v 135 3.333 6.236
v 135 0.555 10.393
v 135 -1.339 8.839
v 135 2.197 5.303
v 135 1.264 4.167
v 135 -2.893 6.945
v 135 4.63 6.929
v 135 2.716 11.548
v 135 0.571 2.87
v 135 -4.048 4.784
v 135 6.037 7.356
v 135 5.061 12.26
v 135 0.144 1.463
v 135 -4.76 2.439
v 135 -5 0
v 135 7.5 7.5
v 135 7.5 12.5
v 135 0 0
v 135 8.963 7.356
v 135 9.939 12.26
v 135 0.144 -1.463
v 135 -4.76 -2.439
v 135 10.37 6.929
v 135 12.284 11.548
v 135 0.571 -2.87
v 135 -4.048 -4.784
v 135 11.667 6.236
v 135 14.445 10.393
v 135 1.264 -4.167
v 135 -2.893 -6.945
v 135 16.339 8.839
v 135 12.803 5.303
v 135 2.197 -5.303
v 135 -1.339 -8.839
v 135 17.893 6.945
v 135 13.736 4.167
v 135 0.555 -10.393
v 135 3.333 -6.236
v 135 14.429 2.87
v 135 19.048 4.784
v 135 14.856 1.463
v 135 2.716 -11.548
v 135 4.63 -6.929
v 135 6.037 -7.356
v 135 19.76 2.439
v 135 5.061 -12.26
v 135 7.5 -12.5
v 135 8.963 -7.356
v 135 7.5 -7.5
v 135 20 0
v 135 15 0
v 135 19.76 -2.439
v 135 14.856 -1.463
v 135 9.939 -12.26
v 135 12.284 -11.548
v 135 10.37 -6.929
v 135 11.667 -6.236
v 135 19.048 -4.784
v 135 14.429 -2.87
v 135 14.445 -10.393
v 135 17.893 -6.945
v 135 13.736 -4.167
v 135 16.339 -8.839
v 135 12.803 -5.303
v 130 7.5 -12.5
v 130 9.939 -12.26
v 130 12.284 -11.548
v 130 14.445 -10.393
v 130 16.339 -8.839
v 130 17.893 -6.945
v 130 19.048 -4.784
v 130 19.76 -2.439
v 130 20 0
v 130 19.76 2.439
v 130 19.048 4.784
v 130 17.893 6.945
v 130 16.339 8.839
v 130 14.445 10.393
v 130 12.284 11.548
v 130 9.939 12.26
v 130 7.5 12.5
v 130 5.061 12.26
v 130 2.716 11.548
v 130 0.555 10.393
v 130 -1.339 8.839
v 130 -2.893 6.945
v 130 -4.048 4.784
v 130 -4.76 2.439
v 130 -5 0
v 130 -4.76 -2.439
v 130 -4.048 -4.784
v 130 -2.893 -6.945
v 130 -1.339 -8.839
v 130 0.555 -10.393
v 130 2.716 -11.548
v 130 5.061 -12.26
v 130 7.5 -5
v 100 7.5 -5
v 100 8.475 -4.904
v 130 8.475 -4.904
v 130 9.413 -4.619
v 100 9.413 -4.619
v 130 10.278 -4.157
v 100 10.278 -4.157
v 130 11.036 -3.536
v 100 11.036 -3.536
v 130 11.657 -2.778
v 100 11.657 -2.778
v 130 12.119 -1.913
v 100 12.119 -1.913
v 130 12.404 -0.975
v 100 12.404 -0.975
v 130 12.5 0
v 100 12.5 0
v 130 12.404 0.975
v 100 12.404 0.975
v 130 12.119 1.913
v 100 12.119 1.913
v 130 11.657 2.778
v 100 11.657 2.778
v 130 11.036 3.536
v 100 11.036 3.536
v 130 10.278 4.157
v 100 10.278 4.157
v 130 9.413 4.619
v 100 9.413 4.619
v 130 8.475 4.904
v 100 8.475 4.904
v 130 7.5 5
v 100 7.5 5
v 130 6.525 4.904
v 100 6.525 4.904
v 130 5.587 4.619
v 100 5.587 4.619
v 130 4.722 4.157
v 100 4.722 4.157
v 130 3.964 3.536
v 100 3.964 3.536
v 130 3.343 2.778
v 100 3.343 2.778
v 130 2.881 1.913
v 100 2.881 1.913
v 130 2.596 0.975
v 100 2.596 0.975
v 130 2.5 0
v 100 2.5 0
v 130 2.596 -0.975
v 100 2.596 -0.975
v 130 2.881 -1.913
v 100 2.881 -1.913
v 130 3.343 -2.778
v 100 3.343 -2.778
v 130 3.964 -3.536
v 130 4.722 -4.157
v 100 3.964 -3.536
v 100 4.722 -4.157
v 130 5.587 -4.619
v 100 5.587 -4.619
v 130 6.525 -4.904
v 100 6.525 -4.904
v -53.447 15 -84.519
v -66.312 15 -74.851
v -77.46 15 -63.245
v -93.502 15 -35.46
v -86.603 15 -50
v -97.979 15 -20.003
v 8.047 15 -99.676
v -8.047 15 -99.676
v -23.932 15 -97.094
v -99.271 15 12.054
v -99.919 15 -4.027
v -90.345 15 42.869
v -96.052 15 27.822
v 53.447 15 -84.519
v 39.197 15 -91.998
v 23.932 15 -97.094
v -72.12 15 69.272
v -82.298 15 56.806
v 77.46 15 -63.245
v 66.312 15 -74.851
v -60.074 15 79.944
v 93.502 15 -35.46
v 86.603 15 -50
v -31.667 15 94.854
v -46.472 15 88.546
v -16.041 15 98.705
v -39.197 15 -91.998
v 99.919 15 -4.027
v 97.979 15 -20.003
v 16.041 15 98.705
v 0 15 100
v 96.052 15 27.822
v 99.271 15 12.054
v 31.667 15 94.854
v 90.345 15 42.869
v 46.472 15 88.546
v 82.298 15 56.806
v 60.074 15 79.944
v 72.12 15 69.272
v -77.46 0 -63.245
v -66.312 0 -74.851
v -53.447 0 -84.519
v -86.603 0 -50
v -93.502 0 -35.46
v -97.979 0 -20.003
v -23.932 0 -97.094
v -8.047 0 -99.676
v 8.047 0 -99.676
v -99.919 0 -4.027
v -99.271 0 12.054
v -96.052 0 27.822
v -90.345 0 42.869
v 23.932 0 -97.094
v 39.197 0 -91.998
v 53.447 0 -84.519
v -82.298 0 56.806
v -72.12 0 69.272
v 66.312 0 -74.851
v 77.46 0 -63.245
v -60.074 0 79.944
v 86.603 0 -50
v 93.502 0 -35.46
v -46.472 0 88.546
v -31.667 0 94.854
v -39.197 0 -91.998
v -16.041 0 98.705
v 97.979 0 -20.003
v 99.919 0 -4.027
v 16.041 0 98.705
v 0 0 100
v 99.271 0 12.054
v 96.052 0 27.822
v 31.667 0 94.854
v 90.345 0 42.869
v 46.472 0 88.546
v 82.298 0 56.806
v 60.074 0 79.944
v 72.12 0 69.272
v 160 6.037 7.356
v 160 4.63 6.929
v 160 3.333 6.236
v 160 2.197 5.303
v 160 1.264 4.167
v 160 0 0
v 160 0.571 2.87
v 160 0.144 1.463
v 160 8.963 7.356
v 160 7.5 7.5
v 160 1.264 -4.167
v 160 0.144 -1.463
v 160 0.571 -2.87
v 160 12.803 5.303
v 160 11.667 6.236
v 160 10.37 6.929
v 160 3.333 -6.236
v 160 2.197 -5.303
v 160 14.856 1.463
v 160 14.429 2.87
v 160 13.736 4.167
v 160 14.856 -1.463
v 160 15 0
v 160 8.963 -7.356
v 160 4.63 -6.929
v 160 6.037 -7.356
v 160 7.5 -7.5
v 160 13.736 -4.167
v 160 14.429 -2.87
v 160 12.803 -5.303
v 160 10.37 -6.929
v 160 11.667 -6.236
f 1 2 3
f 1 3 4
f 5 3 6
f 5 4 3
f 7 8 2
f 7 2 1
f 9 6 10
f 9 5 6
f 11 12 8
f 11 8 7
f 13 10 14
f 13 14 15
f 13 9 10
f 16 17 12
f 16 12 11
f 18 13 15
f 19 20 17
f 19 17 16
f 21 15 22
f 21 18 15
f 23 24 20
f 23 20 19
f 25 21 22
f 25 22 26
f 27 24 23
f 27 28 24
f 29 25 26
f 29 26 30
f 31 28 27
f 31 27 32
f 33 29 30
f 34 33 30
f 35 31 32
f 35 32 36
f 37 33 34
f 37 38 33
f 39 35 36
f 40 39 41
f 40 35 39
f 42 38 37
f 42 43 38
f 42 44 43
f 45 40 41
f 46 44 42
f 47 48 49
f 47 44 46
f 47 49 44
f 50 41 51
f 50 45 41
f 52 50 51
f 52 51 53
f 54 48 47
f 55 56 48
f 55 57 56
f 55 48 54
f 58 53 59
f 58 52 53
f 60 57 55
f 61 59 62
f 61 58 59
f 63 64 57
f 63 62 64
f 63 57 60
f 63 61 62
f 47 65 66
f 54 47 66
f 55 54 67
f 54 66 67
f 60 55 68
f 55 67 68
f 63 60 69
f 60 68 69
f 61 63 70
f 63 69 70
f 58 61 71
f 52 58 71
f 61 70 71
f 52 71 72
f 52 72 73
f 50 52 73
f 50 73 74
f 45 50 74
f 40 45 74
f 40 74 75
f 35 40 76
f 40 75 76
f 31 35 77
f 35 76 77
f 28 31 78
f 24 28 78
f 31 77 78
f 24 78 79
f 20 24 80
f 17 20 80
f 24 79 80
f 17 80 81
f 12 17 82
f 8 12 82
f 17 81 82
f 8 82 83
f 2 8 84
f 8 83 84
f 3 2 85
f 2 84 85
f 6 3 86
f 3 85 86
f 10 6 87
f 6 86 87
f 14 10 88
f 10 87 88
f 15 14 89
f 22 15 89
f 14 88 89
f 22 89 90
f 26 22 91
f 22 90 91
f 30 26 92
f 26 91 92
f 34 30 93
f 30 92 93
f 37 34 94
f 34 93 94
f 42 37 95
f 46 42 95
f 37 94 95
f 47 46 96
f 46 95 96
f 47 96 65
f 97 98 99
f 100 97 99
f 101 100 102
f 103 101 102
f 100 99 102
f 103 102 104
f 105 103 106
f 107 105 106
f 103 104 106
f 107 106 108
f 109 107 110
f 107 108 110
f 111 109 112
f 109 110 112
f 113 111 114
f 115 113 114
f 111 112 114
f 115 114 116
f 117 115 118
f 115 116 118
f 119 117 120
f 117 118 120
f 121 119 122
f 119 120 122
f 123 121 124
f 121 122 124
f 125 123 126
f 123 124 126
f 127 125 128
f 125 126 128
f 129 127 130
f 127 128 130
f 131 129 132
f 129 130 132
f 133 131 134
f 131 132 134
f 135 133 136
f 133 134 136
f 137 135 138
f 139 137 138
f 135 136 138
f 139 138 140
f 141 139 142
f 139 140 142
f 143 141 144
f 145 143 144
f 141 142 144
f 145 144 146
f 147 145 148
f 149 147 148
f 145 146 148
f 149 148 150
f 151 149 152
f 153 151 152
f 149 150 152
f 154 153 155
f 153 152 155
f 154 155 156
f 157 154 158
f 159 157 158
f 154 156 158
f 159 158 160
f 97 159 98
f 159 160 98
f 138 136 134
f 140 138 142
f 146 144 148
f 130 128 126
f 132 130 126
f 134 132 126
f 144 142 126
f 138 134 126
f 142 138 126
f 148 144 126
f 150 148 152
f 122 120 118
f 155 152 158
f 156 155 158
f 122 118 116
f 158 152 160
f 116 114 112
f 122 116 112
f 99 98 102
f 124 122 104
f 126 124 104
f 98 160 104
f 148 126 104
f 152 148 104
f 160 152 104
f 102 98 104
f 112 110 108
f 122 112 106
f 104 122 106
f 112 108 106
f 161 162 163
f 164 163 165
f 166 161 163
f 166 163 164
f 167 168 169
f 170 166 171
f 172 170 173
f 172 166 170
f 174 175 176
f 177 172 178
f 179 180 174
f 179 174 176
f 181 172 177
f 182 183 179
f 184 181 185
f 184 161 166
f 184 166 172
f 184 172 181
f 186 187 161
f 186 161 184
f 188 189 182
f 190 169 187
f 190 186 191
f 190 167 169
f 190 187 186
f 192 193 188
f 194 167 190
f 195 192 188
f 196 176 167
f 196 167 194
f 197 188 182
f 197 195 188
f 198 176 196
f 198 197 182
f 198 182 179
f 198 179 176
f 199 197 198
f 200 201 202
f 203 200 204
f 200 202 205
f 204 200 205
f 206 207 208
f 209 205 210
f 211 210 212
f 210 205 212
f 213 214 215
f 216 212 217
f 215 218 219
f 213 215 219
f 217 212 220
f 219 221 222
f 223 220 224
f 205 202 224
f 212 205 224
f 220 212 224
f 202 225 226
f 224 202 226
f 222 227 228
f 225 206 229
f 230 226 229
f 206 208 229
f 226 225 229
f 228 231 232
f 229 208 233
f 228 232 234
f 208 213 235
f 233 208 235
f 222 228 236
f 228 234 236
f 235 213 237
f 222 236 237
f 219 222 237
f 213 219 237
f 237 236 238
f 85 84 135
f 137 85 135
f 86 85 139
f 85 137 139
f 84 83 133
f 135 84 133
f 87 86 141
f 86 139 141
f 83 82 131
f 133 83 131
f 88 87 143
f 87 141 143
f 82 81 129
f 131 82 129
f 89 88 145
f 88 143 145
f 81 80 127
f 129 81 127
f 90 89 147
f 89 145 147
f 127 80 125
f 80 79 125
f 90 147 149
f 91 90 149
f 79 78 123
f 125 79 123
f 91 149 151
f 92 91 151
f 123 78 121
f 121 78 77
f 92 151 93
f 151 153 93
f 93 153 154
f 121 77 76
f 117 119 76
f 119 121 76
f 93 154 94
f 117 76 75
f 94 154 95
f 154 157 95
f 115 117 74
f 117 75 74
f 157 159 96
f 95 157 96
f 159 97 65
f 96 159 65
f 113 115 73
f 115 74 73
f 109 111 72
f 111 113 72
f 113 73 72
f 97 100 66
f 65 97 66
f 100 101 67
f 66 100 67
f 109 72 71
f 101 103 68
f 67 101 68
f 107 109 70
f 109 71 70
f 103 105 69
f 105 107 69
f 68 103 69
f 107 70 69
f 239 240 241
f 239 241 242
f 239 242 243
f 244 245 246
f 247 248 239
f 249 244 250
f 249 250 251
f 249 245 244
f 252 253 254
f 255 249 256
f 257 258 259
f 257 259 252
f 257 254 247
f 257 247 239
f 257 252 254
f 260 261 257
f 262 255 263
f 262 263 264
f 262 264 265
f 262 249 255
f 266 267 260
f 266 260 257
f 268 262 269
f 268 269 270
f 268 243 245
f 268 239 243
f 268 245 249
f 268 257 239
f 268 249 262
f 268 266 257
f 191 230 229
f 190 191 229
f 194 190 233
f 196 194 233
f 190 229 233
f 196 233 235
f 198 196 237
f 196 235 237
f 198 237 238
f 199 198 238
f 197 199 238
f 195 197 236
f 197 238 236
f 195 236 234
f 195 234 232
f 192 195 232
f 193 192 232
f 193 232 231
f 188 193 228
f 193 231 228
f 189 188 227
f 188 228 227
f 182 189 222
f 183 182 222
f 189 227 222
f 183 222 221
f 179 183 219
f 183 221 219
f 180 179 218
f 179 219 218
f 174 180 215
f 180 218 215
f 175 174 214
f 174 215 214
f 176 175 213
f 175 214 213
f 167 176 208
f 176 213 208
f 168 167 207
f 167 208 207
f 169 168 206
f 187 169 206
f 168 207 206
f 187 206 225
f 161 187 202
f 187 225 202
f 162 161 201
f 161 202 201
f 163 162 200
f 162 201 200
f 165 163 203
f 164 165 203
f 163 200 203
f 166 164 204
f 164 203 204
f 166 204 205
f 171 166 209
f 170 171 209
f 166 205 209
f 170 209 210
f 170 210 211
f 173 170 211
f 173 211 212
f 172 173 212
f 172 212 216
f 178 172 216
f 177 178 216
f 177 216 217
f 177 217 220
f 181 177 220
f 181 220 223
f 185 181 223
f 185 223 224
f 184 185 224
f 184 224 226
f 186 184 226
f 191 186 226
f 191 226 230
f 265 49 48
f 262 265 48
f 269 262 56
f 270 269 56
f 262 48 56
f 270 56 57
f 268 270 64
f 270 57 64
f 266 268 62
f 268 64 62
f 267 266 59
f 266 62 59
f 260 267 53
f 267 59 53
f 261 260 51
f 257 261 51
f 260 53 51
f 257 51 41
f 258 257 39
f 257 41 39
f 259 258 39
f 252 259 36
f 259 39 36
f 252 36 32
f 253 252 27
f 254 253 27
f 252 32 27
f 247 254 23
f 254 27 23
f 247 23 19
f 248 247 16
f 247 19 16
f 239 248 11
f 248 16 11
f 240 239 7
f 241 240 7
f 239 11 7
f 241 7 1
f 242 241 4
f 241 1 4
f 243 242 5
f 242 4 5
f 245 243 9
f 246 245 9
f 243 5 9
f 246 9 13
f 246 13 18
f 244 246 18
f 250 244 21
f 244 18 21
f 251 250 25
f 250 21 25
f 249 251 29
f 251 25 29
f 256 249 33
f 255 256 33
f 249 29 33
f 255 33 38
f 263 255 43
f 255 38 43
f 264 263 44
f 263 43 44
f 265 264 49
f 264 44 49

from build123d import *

# Parameters (mm, degrees)
SKETCH1_R           = 100
BOSS_EXTRUDE1_DEPTH = 15
SKETCH2_R           = 5
BOSS_EXTRUDE2_DEPTH = 30
SKETCH3_R           = 12.5
BOSS_EXTRUDE3_DEPTH = 5
SKETCH4_R           = 7.5
BOSS_EXTRUDE4_DEPTH = 25


with BuildPart() as part:
    # Sketch1 → Boss-Extrude1 (new body)
    with BuildSketch(Plane(origin=(0, 0, 0), x_dir=(1, 0, 0), z_dir=(0, 1, 0))):
        with Locations(Location((0, 0, 0), (0, 0, 270))):
            Circle(SKETCH1_R)
    extrude(amount=BOSS_EXTRUDE1_DEPTH)


with BuildPart() as body_2:
    # Sketch2 → Boss-Extrude2 (new body)
    with BuildSketch(Plane(origin=(100, 0, 0), x_dir=(0, 0, -1), z_dir=(1, 0, 0))):
        with Locations((0, 7.5)):
            Circle(SKETCH2_R)
    extrude(amount=BOSS_EXTRUDE2_DEPTH)

    # Sketch3 → Boss-Extrude3 (add)
    with BuildSketch(Plane(origin=(130, 0, 0), x_dir=(0, 0, -1), z_dir=(1, 0, 0))):
        with Locations((0, 7.5)):
            Circle(SKETCH3_R)
    extrude(amount=BOSS_EXTRUDE3_DEPTH)

    # Sketch4 → Boss-Extrude4 (add)
    with BuildSketch(Plane(origin=(135, 0, 0), x_dir=(0, 0, -1), z_dir=(1, 0, 0))):
        with Locations((0, 7.5)):
            Circle(SKETCH4_R)
    extrude(amount=BOSS_EXTRUDE4_DEPTH)


solid = Compound([part.part, body_2.part])
